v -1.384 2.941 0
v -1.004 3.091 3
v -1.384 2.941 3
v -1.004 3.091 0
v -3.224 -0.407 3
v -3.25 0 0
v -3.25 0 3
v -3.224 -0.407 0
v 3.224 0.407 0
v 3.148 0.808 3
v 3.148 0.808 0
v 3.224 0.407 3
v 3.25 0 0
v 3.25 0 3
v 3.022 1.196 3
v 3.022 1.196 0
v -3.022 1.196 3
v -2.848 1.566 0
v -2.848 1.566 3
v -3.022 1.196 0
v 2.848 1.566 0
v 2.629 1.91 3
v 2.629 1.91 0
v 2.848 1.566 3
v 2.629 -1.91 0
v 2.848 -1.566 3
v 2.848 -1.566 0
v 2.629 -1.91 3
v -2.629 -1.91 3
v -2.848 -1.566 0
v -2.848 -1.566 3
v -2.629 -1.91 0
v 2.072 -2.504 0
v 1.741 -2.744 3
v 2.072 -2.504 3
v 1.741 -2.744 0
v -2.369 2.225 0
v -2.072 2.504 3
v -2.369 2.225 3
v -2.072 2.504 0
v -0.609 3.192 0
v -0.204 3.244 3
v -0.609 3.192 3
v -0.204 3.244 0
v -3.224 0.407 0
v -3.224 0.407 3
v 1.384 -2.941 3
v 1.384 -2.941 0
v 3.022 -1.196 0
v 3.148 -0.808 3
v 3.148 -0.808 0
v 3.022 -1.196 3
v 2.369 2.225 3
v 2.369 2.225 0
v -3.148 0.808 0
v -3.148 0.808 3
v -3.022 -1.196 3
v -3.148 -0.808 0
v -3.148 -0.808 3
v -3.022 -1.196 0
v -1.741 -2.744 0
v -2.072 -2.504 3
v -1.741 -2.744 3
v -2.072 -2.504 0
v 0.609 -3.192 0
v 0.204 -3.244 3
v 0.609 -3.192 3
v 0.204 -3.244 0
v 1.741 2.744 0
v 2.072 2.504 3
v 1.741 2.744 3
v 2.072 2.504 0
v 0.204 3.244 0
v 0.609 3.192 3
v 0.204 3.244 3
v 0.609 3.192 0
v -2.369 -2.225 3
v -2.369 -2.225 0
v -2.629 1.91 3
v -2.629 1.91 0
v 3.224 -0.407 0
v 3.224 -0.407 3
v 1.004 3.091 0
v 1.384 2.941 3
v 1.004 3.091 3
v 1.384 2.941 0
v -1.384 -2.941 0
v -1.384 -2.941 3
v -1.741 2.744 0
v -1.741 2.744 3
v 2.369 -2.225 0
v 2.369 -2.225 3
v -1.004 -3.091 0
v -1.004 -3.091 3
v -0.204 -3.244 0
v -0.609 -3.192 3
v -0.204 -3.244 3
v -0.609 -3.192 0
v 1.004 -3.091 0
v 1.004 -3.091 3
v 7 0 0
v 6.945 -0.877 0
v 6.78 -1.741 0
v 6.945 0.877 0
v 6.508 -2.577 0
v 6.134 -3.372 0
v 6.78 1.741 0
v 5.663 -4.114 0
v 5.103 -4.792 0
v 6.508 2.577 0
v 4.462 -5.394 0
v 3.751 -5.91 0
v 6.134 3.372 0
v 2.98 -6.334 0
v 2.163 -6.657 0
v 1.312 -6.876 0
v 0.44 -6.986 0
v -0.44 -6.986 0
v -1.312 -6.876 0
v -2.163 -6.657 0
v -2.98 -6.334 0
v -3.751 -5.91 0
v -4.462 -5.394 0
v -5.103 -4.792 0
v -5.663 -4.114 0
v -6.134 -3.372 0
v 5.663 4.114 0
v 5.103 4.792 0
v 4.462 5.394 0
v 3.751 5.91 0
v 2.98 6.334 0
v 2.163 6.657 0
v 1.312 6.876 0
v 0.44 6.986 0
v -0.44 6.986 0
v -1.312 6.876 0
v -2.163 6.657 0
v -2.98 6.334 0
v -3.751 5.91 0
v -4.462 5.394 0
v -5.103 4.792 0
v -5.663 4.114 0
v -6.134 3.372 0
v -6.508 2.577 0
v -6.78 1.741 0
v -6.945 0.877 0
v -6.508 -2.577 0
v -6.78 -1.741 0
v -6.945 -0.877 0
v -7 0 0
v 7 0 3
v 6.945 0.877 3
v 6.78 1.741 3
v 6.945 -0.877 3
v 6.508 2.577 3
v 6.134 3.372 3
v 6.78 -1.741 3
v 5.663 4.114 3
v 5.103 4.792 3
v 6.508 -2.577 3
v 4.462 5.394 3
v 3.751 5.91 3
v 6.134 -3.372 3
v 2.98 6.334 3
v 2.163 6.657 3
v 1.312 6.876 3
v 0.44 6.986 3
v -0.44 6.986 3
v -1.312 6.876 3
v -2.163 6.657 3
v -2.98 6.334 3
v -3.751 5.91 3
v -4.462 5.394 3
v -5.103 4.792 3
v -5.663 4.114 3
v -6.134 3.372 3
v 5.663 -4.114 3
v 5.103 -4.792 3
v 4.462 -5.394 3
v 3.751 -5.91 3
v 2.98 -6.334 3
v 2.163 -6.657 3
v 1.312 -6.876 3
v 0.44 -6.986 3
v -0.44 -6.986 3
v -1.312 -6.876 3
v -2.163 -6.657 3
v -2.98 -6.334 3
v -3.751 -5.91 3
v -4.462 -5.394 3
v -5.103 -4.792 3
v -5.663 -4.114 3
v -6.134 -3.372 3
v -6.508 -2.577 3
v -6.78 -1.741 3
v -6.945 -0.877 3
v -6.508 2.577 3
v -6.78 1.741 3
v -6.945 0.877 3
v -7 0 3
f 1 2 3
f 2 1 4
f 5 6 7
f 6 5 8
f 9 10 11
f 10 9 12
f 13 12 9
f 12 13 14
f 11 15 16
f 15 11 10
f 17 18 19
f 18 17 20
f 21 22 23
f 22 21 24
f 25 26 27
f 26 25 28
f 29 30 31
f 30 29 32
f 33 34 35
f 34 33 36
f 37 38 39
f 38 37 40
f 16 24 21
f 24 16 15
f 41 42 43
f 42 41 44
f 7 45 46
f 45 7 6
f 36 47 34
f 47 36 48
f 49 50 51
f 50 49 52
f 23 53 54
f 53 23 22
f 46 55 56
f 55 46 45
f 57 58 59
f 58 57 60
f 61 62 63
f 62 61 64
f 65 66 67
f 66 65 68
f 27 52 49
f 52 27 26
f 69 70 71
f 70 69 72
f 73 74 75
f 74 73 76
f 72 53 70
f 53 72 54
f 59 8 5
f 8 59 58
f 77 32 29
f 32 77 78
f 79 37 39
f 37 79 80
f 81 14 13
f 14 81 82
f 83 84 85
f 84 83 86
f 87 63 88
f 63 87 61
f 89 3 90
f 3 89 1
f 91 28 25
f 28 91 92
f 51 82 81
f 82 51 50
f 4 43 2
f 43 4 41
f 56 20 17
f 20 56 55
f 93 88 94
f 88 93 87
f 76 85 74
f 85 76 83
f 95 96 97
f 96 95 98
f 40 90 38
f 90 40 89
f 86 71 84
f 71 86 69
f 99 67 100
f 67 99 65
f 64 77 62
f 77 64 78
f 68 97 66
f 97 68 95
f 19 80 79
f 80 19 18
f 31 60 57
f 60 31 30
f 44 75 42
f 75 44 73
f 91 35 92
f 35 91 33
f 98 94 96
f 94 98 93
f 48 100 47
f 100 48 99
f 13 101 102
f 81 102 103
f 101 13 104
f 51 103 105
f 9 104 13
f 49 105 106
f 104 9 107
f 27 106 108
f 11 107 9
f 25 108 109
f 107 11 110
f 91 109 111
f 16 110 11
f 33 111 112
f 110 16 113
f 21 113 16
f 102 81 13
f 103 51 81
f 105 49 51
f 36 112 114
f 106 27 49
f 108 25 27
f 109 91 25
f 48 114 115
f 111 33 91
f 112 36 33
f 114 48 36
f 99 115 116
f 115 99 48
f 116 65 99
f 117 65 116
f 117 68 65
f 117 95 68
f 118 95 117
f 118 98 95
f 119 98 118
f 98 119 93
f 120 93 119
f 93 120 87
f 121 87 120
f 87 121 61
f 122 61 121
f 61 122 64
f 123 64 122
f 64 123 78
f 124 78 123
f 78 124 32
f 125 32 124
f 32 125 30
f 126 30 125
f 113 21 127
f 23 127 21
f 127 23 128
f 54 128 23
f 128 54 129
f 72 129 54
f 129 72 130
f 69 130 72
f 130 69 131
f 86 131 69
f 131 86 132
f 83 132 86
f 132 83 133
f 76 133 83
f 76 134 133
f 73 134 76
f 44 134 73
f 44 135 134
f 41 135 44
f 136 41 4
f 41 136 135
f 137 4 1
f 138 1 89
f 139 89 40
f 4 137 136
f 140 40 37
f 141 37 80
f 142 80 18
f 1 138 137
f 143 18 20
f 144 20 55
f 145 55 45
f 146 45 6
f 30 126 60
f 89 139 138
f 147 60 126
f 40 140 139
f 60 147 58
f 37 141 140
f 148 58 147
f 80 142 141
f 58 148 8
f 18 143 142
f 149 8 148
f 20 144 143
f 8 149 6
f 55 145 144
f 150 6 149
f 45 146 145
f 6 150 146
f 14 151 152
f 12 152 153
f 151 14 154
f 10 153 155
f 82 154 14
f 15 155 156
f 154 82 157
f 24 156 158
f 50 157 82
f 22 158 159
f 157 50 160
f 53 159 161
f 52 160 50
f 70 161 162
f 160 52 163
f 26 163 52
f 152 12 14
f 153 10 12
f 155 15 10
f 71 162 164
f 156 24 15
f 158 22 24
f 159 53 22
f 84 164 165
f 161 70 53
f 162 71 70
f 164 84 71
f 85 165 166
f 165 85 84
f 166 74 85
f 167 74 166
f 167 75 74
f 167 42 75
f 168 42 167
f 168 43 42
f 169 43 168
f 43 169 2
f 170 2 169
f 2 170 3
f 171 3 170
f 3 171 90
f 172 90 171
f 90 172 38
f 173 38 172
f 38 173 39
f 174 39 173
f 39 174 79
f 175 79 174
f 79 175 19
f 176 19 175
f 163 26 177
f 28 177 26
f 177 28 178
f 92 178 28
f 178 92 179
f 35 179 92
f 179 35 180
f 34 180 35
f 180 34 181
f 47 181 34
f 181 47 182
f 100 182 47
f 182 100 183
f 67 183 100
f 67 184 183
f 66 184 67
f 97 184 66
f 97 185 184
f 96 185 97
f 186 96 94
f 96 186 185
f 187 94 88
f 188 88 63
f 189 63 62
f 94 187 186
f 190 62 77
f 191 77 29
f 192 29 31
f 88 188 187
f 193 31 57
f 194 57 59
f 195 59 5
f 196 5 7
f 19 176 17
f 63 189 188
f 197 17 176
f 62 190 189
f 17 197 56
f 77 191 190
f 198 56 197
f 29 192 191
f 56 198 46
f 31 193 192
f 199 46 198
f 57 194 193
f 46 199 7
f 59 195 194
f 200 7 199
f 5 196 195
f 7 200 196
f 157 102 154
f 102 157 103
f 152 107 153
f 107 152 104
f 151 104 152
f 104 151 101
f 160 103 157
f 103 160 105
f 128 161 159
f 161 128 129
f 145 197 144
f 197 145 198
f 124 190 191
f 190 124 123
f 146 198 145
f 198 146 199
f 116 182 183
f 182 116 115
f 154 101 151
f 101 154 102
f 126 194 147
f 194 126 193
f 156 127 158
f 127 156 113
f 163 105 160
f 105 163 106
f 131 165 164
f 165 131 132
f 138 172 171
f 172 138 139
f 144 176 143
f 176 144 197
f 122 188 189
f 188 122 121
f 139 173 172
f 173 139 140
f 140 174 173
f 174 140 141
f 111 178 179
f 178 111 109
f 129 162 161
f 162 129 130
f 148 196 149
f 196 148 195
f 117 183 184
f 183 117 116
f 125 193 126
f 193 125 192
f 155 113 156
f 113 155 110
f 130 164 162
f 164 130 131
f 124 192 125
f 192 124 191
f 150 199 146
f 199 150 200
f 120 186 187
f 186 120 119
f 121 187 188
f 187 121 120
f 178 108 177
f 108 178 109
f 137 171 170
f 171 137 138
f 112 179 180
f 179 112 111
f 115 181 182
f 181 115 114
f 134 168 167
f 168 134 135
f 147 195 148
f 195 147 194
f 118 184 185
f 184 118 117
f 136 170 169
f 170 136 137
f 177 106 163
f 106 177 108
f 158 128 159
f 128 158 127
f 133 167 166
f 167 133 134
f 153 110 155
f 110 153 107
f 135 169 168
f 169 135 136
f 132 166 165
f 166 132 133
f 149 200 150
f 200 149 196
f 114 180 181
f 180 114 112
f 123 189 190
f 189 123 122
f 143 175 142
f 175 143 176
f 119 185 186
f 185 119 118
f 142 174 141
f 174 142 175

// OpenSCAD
$fn = 50;


difference() {
	union() {
		cylinder(h = 3, r = 7.0000000000);
	}
	union() {
		cylinder(h = 3, r = 3.2500000000);
		cylinder(h = 3, r = 1.8000000000);
		cylinder(h = 3, r = 1.8000000000);
		cylinder(h = 3, r = 1.8000000000);
	}
}
